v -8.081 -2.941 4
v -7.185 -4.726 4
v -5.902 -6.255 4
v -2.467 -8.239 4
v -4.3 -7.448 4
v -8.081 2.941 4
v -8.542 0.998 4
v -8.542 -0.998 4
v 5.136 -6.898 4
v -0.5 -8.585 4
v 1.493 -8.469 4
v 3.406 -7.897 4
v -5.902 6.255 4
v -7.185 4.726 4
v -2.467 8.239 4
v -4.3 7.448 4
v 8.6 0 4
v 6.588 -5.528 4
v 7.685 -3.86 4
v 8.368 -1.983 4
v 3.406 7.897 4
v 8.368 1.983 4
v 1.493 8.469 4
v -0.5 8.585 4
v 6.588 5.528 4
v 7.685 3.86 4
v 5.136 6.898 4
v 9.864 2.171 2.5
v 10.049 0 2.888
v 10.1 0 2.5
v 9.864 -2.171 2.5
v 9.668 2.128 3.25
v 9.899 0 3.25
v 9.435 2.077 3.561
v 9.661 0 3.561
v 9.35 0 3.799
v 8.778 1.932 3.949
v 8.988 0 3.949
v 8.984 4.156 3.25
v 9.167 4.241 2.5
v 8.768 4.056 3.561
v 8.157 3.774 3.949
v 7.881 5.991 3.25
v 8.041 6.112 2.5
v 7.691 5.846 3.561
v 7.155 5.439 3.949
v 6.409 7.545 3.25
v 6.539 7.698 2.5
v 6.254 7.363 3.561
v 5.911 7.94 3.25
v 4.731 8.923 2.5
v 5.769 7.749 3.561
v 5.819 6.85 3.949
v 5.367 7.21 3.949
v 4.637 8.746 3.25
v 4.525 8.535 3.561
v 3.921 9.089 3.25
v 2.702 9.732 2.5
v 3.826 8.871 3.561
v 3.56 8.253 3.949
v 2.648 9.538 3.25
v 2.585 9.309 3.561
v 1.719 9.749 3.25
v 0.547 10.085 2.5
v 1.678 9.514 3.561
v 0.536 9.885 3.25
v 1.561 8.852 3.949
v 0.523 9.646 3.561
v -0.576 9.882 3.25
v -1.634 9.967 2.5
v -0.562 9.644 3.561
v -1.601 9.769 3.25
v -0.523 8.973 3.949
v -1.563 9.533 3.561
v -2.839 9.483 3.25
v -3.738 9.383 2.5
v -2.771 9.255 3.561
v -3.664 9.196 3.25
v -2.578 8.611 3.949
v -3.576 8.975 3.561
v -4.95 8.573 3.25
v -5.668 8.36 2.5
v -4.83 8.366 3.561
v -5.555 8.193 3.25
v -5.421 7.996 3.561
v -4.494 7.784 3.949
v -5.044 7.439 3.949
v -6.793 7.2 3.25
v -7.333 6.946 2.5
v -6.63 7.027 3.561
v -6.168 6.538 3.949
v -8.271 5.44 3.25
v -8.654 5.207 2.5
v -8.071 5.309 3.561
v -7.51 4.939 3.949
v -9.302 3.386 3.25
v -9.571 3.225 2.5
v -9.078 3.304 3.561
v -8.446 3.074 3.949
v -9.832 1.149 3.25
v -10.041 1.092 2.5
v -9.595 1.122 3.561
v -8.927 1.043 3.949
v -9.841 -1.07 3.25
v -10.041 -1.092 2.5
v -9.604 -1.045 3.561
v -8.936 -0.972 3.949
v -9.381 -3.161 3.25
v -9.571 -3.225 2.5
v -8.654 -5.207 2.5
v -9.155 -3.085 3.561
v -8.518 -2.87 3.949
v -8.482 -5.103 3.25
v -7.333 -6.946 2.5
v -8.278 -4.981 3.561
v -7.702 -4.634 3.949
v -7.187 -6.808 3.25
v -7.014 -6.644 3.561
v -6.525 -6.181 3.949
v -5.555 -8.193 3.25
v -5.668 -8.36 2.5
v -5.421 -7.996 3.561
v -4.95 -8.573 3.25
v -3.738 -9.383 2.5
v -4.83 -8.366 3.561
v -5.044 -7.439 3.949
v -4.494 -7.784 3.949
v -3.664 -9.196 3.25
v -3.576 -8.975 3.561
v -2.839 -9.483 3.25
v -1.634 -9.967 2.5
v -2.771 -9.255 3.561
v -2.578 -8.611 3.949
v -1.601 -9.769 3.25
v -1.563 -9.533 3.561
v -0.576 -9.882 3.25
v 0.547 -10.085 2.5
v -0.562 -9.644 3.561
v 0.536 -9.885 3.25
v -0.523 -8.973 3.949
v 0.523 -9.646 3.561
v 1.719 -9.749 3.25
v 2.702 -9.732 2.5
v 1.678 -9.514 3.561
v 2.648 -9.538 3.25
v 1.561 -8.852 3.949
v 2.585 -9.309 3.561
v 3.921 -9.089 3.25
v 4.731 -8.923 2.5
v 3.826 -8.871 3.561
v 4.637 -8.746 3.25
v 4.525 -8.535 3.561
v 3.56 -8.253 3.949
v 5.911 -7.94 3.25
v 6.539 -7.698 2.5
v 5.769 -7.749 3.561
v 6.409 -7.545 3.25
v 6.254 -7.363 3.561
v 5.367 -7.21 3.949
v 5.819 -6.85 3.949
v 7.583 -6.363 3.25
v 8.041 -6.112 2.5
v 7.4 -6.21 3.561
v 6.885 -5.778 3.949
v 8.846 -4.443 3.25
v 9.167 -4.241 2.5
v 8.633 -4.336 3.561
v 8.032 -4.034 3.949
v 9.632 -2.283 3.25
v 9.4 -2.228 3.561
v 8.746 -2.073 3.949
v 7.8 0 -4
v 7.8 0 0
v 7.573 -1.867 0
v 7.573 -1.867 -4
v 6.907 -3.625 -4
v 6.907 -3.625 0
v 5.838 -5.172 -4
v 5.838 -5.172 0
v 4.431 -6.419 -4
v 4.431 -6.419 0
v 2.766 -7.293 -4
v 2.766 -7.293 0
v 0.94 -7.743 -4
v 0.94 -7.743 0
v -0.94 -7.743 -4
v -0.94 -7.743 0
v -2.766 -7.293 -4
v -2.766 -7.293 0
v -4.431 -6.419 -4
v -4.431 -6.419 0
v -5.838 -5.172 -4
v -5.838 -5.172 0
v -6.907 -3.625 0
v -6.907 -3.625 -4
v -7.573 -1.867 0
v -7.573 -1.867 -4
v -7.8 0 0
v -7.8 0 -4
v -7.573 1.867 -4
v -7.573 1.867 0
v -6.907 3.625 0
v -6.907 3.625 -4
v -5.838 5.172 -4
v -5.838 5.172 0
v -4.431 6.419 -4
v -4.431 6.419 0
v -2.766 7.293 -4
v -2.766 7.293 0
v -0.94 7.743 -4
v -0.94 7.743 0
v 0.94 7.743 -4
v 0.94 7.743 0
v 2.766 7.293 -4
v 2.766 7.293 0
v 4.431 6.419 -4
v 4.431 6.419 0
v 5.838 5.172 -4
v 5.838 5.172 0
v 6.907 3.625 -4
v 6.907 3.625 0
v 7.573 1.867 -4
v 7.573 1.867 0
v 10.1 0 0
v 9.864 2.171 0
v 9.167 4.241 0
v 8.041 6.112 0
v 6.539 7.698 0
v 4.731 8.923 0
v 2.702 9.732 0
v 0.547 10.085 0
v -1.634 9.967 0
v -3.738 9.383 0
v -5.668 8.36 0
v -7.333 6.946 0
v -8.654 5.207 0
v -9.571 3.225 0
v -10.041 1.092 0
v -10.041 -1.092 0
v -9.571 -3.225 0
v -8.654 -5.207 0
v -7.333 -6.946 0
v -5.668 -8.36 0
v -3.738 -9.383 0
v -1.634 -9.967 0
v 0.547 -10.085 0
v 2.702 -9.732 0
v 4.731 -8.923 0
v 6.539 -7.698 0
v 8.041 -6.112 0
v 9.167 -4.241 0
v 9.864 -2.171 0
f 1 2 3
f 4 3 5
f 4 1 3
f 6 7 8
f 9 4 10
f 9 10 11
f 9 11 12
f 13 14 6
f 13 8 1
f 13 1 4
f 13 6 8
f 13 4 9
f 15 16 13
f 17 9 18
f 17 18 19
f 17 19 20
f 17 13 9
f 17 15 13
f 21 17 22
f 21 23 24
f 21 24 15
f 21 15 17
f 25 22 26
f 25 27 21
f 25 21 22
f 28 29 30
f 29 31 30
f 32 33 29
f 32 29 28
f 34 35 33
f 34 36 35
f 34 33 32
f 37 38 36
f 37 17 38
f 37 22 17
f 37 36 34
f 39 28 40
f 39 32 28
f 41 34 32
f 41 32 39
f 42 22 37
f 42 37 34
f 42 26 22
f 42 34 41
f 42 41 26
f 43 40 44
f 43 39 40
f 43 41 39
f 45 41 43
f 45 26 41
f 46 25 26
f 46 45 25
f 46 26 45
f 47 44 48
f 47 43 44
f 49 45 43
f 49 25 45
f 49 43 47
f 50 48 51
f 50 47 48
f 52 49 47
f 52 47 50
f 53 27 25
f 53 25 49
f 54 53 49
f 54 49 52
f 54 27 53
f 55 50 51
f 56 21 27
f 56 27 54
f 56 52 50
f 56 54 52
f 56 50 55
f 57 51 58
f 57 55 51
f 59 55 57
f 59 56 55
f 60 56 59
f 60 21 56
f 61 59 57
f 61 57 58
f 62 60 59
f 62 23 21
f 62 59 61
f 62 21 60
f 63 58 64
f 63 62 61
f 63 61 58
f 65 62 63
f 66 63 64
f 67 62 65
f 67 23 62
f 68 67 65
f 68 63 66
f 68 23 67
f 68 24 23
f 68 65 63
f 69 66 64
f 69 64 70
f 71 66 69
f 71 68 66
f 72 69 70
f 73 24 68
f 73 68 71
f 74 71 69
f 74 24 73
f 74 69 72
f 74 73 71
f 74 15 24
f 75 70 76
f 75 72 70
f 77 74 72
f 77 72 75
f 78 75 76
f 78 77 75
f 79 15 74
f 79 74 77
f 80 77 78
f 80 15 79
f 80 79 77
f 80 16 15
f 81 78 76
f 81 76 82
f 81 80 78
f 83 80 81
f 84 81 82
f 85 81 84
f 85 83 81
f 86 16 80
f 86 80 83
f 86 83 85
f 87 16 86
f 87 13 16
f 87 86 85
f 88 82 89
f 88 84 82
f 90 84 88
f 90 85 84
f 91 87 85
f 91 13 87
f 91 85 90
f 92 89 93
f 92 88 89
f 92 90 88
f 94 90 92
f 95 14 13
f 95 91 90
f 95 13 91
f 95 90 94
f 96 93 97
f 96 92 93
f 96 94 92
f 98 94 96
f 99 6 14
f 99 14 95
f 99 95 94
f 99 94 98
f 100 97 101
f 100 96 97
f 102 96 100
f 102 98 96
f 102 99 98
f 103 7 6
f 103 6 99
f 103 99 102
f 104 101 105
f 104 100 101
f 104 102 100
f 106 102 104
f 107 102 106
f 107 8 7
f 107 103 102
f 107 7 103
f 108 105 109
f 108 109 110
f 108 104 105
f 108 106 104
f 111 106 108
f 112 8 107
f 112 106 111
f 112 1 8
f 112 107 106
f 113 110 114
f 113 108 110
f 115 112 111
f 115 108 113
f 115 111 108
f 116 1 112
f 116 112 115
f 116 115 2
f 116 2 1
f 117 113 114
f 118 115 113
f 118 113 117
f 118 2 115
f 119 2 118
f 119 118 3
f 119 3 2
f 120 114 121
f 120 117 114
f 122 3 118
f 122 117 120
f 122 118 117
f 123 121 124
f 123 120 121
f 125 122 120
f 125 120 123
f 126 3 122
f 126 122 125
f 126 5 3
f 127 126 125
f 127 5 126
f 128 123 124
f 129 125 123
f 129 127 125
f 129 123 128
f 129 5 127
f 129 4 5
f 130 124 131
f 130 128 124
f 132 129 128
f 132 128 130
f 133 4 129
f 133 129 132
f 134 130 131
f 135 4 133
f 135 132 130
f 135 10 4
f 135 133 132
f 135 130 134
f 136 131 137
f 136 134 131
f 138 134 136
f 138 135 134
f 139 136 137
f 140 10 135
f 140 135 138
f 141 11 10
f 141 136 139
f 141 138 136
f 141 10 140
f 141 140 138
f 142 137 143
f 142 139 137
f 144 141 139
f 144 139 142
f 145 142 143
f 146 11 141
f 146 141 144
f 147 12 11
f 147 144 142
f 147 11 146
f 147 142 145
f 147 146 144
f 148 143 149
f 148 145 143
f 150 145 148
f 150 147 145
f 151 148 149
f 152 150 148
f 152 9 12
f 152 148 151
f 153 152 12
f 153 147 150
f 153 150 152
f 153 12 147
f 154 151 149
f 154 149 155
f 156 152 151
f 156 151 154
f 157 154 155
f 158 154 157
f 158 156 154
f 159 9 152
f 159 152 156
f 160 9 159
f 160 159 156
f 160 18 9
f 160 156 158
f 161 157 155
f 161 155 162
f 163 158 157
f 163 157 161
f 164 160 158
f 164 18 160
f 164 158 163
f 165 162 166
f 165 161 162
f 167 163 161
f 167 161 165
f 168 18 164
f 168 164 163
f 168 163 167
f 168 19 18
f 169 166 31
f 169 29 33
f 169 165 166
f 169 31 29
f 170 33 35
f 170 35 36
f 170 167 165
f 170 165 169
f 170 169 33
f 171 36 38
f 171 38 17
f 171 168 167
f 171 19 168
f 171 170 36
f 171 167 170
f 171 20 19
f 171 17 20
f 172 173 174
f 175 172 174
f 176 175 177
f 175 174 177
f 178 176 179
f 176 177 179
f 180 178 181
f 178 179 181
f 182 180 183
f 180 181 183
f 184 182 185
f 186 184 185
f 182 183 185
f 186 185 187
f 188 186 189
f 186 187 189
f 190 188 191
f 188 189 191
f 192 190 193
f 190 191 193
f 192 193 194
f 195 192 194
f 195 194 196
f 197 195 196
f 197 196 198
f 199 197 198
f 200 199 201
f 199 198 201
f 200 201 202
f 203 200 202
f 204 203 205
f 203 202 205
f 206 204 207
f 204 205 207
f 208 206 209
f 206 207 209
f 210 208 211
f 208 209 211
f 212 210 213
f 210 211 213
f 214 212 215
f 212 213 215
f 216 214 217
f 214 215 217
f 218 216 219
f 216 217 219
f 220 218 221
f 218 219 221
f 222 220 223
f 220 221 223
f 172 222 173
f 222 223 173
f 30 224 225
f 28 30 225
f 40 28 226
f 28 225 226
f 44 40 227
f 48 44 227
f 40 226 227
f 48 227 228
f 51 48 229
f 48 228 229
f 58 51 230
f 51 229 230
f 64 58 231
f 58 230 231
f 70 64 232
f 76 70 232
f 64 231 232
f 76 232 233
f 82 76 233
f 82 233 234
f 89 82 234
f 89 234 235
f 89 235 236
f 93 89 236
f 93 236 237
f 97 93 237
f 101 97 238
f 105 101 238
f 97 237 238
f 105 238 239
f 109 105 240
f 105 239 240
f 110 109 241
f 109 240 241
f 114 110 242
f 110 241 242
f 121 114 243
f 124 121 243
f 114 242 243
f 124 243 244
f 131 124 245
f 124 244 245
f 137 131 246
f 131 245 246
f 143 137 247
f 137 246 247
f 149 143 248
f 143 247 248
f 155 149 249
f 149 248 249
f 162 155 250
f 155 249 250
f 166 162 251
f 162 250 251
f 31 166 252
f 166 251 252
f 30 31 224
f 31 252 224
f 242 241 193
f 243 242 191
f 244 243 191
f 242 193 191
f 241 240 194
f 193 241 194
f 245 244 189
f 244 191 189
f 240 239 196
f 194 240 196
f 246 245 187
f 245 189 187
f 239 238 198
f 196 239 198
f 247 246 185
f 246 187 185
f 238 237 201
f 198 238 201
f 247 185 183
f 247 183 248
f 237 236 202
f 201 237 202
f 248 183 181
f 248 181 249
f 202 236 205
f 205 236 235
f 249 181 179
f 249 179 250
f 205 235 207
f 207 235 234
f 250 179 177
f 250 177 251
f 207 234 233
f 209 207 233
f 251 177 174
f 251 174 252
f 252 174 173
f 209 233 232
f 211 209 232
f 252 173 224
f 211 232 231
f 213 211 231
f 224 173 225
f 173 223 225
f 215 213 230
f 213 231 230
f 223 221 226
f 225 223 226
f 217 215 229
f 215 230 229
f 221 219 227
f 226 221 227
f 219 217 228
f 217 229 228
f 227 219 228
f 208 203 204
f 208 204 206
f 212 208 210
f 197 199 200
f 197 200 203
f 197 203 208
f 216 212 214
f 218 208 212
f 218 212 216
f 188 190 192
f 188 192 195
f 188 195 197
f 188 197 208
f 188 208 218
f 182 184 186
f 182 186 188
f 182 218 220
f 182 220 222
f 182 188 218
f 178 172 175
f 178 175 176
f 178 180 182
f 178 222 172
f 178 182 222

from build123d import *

# Parameters (mm, degrees)
F0_R     = 10.1
F1_DEPTH = 4
F2_R     = 1.5
F3_R     = 7.8
F4_DEPTH = 4


with BuildPart() as f1:
    # F0 (on Top) → F1 (new body)
    with BuildSketch(Plane.XY):
        Circle(F0_R)
    extrude(amount=F1_DEPTH)

    # F2
    f2_edges = [f1.edges().sort_by_distance(p)[0] for p in [
        (-10.1, 0, 4),
    ]]
    fillet(f2_edges, radius=F2_R)

    # F3 (on face) → F4 (join)
    with BuildSketch(Plane(origin=(0, 0, 0), x_dir=(1, 0, 0), z_dir=(0, 0, -1))):
        Circle(F3_R)
    extrude(amount=F4_DEPTH)


solid = f1.part
